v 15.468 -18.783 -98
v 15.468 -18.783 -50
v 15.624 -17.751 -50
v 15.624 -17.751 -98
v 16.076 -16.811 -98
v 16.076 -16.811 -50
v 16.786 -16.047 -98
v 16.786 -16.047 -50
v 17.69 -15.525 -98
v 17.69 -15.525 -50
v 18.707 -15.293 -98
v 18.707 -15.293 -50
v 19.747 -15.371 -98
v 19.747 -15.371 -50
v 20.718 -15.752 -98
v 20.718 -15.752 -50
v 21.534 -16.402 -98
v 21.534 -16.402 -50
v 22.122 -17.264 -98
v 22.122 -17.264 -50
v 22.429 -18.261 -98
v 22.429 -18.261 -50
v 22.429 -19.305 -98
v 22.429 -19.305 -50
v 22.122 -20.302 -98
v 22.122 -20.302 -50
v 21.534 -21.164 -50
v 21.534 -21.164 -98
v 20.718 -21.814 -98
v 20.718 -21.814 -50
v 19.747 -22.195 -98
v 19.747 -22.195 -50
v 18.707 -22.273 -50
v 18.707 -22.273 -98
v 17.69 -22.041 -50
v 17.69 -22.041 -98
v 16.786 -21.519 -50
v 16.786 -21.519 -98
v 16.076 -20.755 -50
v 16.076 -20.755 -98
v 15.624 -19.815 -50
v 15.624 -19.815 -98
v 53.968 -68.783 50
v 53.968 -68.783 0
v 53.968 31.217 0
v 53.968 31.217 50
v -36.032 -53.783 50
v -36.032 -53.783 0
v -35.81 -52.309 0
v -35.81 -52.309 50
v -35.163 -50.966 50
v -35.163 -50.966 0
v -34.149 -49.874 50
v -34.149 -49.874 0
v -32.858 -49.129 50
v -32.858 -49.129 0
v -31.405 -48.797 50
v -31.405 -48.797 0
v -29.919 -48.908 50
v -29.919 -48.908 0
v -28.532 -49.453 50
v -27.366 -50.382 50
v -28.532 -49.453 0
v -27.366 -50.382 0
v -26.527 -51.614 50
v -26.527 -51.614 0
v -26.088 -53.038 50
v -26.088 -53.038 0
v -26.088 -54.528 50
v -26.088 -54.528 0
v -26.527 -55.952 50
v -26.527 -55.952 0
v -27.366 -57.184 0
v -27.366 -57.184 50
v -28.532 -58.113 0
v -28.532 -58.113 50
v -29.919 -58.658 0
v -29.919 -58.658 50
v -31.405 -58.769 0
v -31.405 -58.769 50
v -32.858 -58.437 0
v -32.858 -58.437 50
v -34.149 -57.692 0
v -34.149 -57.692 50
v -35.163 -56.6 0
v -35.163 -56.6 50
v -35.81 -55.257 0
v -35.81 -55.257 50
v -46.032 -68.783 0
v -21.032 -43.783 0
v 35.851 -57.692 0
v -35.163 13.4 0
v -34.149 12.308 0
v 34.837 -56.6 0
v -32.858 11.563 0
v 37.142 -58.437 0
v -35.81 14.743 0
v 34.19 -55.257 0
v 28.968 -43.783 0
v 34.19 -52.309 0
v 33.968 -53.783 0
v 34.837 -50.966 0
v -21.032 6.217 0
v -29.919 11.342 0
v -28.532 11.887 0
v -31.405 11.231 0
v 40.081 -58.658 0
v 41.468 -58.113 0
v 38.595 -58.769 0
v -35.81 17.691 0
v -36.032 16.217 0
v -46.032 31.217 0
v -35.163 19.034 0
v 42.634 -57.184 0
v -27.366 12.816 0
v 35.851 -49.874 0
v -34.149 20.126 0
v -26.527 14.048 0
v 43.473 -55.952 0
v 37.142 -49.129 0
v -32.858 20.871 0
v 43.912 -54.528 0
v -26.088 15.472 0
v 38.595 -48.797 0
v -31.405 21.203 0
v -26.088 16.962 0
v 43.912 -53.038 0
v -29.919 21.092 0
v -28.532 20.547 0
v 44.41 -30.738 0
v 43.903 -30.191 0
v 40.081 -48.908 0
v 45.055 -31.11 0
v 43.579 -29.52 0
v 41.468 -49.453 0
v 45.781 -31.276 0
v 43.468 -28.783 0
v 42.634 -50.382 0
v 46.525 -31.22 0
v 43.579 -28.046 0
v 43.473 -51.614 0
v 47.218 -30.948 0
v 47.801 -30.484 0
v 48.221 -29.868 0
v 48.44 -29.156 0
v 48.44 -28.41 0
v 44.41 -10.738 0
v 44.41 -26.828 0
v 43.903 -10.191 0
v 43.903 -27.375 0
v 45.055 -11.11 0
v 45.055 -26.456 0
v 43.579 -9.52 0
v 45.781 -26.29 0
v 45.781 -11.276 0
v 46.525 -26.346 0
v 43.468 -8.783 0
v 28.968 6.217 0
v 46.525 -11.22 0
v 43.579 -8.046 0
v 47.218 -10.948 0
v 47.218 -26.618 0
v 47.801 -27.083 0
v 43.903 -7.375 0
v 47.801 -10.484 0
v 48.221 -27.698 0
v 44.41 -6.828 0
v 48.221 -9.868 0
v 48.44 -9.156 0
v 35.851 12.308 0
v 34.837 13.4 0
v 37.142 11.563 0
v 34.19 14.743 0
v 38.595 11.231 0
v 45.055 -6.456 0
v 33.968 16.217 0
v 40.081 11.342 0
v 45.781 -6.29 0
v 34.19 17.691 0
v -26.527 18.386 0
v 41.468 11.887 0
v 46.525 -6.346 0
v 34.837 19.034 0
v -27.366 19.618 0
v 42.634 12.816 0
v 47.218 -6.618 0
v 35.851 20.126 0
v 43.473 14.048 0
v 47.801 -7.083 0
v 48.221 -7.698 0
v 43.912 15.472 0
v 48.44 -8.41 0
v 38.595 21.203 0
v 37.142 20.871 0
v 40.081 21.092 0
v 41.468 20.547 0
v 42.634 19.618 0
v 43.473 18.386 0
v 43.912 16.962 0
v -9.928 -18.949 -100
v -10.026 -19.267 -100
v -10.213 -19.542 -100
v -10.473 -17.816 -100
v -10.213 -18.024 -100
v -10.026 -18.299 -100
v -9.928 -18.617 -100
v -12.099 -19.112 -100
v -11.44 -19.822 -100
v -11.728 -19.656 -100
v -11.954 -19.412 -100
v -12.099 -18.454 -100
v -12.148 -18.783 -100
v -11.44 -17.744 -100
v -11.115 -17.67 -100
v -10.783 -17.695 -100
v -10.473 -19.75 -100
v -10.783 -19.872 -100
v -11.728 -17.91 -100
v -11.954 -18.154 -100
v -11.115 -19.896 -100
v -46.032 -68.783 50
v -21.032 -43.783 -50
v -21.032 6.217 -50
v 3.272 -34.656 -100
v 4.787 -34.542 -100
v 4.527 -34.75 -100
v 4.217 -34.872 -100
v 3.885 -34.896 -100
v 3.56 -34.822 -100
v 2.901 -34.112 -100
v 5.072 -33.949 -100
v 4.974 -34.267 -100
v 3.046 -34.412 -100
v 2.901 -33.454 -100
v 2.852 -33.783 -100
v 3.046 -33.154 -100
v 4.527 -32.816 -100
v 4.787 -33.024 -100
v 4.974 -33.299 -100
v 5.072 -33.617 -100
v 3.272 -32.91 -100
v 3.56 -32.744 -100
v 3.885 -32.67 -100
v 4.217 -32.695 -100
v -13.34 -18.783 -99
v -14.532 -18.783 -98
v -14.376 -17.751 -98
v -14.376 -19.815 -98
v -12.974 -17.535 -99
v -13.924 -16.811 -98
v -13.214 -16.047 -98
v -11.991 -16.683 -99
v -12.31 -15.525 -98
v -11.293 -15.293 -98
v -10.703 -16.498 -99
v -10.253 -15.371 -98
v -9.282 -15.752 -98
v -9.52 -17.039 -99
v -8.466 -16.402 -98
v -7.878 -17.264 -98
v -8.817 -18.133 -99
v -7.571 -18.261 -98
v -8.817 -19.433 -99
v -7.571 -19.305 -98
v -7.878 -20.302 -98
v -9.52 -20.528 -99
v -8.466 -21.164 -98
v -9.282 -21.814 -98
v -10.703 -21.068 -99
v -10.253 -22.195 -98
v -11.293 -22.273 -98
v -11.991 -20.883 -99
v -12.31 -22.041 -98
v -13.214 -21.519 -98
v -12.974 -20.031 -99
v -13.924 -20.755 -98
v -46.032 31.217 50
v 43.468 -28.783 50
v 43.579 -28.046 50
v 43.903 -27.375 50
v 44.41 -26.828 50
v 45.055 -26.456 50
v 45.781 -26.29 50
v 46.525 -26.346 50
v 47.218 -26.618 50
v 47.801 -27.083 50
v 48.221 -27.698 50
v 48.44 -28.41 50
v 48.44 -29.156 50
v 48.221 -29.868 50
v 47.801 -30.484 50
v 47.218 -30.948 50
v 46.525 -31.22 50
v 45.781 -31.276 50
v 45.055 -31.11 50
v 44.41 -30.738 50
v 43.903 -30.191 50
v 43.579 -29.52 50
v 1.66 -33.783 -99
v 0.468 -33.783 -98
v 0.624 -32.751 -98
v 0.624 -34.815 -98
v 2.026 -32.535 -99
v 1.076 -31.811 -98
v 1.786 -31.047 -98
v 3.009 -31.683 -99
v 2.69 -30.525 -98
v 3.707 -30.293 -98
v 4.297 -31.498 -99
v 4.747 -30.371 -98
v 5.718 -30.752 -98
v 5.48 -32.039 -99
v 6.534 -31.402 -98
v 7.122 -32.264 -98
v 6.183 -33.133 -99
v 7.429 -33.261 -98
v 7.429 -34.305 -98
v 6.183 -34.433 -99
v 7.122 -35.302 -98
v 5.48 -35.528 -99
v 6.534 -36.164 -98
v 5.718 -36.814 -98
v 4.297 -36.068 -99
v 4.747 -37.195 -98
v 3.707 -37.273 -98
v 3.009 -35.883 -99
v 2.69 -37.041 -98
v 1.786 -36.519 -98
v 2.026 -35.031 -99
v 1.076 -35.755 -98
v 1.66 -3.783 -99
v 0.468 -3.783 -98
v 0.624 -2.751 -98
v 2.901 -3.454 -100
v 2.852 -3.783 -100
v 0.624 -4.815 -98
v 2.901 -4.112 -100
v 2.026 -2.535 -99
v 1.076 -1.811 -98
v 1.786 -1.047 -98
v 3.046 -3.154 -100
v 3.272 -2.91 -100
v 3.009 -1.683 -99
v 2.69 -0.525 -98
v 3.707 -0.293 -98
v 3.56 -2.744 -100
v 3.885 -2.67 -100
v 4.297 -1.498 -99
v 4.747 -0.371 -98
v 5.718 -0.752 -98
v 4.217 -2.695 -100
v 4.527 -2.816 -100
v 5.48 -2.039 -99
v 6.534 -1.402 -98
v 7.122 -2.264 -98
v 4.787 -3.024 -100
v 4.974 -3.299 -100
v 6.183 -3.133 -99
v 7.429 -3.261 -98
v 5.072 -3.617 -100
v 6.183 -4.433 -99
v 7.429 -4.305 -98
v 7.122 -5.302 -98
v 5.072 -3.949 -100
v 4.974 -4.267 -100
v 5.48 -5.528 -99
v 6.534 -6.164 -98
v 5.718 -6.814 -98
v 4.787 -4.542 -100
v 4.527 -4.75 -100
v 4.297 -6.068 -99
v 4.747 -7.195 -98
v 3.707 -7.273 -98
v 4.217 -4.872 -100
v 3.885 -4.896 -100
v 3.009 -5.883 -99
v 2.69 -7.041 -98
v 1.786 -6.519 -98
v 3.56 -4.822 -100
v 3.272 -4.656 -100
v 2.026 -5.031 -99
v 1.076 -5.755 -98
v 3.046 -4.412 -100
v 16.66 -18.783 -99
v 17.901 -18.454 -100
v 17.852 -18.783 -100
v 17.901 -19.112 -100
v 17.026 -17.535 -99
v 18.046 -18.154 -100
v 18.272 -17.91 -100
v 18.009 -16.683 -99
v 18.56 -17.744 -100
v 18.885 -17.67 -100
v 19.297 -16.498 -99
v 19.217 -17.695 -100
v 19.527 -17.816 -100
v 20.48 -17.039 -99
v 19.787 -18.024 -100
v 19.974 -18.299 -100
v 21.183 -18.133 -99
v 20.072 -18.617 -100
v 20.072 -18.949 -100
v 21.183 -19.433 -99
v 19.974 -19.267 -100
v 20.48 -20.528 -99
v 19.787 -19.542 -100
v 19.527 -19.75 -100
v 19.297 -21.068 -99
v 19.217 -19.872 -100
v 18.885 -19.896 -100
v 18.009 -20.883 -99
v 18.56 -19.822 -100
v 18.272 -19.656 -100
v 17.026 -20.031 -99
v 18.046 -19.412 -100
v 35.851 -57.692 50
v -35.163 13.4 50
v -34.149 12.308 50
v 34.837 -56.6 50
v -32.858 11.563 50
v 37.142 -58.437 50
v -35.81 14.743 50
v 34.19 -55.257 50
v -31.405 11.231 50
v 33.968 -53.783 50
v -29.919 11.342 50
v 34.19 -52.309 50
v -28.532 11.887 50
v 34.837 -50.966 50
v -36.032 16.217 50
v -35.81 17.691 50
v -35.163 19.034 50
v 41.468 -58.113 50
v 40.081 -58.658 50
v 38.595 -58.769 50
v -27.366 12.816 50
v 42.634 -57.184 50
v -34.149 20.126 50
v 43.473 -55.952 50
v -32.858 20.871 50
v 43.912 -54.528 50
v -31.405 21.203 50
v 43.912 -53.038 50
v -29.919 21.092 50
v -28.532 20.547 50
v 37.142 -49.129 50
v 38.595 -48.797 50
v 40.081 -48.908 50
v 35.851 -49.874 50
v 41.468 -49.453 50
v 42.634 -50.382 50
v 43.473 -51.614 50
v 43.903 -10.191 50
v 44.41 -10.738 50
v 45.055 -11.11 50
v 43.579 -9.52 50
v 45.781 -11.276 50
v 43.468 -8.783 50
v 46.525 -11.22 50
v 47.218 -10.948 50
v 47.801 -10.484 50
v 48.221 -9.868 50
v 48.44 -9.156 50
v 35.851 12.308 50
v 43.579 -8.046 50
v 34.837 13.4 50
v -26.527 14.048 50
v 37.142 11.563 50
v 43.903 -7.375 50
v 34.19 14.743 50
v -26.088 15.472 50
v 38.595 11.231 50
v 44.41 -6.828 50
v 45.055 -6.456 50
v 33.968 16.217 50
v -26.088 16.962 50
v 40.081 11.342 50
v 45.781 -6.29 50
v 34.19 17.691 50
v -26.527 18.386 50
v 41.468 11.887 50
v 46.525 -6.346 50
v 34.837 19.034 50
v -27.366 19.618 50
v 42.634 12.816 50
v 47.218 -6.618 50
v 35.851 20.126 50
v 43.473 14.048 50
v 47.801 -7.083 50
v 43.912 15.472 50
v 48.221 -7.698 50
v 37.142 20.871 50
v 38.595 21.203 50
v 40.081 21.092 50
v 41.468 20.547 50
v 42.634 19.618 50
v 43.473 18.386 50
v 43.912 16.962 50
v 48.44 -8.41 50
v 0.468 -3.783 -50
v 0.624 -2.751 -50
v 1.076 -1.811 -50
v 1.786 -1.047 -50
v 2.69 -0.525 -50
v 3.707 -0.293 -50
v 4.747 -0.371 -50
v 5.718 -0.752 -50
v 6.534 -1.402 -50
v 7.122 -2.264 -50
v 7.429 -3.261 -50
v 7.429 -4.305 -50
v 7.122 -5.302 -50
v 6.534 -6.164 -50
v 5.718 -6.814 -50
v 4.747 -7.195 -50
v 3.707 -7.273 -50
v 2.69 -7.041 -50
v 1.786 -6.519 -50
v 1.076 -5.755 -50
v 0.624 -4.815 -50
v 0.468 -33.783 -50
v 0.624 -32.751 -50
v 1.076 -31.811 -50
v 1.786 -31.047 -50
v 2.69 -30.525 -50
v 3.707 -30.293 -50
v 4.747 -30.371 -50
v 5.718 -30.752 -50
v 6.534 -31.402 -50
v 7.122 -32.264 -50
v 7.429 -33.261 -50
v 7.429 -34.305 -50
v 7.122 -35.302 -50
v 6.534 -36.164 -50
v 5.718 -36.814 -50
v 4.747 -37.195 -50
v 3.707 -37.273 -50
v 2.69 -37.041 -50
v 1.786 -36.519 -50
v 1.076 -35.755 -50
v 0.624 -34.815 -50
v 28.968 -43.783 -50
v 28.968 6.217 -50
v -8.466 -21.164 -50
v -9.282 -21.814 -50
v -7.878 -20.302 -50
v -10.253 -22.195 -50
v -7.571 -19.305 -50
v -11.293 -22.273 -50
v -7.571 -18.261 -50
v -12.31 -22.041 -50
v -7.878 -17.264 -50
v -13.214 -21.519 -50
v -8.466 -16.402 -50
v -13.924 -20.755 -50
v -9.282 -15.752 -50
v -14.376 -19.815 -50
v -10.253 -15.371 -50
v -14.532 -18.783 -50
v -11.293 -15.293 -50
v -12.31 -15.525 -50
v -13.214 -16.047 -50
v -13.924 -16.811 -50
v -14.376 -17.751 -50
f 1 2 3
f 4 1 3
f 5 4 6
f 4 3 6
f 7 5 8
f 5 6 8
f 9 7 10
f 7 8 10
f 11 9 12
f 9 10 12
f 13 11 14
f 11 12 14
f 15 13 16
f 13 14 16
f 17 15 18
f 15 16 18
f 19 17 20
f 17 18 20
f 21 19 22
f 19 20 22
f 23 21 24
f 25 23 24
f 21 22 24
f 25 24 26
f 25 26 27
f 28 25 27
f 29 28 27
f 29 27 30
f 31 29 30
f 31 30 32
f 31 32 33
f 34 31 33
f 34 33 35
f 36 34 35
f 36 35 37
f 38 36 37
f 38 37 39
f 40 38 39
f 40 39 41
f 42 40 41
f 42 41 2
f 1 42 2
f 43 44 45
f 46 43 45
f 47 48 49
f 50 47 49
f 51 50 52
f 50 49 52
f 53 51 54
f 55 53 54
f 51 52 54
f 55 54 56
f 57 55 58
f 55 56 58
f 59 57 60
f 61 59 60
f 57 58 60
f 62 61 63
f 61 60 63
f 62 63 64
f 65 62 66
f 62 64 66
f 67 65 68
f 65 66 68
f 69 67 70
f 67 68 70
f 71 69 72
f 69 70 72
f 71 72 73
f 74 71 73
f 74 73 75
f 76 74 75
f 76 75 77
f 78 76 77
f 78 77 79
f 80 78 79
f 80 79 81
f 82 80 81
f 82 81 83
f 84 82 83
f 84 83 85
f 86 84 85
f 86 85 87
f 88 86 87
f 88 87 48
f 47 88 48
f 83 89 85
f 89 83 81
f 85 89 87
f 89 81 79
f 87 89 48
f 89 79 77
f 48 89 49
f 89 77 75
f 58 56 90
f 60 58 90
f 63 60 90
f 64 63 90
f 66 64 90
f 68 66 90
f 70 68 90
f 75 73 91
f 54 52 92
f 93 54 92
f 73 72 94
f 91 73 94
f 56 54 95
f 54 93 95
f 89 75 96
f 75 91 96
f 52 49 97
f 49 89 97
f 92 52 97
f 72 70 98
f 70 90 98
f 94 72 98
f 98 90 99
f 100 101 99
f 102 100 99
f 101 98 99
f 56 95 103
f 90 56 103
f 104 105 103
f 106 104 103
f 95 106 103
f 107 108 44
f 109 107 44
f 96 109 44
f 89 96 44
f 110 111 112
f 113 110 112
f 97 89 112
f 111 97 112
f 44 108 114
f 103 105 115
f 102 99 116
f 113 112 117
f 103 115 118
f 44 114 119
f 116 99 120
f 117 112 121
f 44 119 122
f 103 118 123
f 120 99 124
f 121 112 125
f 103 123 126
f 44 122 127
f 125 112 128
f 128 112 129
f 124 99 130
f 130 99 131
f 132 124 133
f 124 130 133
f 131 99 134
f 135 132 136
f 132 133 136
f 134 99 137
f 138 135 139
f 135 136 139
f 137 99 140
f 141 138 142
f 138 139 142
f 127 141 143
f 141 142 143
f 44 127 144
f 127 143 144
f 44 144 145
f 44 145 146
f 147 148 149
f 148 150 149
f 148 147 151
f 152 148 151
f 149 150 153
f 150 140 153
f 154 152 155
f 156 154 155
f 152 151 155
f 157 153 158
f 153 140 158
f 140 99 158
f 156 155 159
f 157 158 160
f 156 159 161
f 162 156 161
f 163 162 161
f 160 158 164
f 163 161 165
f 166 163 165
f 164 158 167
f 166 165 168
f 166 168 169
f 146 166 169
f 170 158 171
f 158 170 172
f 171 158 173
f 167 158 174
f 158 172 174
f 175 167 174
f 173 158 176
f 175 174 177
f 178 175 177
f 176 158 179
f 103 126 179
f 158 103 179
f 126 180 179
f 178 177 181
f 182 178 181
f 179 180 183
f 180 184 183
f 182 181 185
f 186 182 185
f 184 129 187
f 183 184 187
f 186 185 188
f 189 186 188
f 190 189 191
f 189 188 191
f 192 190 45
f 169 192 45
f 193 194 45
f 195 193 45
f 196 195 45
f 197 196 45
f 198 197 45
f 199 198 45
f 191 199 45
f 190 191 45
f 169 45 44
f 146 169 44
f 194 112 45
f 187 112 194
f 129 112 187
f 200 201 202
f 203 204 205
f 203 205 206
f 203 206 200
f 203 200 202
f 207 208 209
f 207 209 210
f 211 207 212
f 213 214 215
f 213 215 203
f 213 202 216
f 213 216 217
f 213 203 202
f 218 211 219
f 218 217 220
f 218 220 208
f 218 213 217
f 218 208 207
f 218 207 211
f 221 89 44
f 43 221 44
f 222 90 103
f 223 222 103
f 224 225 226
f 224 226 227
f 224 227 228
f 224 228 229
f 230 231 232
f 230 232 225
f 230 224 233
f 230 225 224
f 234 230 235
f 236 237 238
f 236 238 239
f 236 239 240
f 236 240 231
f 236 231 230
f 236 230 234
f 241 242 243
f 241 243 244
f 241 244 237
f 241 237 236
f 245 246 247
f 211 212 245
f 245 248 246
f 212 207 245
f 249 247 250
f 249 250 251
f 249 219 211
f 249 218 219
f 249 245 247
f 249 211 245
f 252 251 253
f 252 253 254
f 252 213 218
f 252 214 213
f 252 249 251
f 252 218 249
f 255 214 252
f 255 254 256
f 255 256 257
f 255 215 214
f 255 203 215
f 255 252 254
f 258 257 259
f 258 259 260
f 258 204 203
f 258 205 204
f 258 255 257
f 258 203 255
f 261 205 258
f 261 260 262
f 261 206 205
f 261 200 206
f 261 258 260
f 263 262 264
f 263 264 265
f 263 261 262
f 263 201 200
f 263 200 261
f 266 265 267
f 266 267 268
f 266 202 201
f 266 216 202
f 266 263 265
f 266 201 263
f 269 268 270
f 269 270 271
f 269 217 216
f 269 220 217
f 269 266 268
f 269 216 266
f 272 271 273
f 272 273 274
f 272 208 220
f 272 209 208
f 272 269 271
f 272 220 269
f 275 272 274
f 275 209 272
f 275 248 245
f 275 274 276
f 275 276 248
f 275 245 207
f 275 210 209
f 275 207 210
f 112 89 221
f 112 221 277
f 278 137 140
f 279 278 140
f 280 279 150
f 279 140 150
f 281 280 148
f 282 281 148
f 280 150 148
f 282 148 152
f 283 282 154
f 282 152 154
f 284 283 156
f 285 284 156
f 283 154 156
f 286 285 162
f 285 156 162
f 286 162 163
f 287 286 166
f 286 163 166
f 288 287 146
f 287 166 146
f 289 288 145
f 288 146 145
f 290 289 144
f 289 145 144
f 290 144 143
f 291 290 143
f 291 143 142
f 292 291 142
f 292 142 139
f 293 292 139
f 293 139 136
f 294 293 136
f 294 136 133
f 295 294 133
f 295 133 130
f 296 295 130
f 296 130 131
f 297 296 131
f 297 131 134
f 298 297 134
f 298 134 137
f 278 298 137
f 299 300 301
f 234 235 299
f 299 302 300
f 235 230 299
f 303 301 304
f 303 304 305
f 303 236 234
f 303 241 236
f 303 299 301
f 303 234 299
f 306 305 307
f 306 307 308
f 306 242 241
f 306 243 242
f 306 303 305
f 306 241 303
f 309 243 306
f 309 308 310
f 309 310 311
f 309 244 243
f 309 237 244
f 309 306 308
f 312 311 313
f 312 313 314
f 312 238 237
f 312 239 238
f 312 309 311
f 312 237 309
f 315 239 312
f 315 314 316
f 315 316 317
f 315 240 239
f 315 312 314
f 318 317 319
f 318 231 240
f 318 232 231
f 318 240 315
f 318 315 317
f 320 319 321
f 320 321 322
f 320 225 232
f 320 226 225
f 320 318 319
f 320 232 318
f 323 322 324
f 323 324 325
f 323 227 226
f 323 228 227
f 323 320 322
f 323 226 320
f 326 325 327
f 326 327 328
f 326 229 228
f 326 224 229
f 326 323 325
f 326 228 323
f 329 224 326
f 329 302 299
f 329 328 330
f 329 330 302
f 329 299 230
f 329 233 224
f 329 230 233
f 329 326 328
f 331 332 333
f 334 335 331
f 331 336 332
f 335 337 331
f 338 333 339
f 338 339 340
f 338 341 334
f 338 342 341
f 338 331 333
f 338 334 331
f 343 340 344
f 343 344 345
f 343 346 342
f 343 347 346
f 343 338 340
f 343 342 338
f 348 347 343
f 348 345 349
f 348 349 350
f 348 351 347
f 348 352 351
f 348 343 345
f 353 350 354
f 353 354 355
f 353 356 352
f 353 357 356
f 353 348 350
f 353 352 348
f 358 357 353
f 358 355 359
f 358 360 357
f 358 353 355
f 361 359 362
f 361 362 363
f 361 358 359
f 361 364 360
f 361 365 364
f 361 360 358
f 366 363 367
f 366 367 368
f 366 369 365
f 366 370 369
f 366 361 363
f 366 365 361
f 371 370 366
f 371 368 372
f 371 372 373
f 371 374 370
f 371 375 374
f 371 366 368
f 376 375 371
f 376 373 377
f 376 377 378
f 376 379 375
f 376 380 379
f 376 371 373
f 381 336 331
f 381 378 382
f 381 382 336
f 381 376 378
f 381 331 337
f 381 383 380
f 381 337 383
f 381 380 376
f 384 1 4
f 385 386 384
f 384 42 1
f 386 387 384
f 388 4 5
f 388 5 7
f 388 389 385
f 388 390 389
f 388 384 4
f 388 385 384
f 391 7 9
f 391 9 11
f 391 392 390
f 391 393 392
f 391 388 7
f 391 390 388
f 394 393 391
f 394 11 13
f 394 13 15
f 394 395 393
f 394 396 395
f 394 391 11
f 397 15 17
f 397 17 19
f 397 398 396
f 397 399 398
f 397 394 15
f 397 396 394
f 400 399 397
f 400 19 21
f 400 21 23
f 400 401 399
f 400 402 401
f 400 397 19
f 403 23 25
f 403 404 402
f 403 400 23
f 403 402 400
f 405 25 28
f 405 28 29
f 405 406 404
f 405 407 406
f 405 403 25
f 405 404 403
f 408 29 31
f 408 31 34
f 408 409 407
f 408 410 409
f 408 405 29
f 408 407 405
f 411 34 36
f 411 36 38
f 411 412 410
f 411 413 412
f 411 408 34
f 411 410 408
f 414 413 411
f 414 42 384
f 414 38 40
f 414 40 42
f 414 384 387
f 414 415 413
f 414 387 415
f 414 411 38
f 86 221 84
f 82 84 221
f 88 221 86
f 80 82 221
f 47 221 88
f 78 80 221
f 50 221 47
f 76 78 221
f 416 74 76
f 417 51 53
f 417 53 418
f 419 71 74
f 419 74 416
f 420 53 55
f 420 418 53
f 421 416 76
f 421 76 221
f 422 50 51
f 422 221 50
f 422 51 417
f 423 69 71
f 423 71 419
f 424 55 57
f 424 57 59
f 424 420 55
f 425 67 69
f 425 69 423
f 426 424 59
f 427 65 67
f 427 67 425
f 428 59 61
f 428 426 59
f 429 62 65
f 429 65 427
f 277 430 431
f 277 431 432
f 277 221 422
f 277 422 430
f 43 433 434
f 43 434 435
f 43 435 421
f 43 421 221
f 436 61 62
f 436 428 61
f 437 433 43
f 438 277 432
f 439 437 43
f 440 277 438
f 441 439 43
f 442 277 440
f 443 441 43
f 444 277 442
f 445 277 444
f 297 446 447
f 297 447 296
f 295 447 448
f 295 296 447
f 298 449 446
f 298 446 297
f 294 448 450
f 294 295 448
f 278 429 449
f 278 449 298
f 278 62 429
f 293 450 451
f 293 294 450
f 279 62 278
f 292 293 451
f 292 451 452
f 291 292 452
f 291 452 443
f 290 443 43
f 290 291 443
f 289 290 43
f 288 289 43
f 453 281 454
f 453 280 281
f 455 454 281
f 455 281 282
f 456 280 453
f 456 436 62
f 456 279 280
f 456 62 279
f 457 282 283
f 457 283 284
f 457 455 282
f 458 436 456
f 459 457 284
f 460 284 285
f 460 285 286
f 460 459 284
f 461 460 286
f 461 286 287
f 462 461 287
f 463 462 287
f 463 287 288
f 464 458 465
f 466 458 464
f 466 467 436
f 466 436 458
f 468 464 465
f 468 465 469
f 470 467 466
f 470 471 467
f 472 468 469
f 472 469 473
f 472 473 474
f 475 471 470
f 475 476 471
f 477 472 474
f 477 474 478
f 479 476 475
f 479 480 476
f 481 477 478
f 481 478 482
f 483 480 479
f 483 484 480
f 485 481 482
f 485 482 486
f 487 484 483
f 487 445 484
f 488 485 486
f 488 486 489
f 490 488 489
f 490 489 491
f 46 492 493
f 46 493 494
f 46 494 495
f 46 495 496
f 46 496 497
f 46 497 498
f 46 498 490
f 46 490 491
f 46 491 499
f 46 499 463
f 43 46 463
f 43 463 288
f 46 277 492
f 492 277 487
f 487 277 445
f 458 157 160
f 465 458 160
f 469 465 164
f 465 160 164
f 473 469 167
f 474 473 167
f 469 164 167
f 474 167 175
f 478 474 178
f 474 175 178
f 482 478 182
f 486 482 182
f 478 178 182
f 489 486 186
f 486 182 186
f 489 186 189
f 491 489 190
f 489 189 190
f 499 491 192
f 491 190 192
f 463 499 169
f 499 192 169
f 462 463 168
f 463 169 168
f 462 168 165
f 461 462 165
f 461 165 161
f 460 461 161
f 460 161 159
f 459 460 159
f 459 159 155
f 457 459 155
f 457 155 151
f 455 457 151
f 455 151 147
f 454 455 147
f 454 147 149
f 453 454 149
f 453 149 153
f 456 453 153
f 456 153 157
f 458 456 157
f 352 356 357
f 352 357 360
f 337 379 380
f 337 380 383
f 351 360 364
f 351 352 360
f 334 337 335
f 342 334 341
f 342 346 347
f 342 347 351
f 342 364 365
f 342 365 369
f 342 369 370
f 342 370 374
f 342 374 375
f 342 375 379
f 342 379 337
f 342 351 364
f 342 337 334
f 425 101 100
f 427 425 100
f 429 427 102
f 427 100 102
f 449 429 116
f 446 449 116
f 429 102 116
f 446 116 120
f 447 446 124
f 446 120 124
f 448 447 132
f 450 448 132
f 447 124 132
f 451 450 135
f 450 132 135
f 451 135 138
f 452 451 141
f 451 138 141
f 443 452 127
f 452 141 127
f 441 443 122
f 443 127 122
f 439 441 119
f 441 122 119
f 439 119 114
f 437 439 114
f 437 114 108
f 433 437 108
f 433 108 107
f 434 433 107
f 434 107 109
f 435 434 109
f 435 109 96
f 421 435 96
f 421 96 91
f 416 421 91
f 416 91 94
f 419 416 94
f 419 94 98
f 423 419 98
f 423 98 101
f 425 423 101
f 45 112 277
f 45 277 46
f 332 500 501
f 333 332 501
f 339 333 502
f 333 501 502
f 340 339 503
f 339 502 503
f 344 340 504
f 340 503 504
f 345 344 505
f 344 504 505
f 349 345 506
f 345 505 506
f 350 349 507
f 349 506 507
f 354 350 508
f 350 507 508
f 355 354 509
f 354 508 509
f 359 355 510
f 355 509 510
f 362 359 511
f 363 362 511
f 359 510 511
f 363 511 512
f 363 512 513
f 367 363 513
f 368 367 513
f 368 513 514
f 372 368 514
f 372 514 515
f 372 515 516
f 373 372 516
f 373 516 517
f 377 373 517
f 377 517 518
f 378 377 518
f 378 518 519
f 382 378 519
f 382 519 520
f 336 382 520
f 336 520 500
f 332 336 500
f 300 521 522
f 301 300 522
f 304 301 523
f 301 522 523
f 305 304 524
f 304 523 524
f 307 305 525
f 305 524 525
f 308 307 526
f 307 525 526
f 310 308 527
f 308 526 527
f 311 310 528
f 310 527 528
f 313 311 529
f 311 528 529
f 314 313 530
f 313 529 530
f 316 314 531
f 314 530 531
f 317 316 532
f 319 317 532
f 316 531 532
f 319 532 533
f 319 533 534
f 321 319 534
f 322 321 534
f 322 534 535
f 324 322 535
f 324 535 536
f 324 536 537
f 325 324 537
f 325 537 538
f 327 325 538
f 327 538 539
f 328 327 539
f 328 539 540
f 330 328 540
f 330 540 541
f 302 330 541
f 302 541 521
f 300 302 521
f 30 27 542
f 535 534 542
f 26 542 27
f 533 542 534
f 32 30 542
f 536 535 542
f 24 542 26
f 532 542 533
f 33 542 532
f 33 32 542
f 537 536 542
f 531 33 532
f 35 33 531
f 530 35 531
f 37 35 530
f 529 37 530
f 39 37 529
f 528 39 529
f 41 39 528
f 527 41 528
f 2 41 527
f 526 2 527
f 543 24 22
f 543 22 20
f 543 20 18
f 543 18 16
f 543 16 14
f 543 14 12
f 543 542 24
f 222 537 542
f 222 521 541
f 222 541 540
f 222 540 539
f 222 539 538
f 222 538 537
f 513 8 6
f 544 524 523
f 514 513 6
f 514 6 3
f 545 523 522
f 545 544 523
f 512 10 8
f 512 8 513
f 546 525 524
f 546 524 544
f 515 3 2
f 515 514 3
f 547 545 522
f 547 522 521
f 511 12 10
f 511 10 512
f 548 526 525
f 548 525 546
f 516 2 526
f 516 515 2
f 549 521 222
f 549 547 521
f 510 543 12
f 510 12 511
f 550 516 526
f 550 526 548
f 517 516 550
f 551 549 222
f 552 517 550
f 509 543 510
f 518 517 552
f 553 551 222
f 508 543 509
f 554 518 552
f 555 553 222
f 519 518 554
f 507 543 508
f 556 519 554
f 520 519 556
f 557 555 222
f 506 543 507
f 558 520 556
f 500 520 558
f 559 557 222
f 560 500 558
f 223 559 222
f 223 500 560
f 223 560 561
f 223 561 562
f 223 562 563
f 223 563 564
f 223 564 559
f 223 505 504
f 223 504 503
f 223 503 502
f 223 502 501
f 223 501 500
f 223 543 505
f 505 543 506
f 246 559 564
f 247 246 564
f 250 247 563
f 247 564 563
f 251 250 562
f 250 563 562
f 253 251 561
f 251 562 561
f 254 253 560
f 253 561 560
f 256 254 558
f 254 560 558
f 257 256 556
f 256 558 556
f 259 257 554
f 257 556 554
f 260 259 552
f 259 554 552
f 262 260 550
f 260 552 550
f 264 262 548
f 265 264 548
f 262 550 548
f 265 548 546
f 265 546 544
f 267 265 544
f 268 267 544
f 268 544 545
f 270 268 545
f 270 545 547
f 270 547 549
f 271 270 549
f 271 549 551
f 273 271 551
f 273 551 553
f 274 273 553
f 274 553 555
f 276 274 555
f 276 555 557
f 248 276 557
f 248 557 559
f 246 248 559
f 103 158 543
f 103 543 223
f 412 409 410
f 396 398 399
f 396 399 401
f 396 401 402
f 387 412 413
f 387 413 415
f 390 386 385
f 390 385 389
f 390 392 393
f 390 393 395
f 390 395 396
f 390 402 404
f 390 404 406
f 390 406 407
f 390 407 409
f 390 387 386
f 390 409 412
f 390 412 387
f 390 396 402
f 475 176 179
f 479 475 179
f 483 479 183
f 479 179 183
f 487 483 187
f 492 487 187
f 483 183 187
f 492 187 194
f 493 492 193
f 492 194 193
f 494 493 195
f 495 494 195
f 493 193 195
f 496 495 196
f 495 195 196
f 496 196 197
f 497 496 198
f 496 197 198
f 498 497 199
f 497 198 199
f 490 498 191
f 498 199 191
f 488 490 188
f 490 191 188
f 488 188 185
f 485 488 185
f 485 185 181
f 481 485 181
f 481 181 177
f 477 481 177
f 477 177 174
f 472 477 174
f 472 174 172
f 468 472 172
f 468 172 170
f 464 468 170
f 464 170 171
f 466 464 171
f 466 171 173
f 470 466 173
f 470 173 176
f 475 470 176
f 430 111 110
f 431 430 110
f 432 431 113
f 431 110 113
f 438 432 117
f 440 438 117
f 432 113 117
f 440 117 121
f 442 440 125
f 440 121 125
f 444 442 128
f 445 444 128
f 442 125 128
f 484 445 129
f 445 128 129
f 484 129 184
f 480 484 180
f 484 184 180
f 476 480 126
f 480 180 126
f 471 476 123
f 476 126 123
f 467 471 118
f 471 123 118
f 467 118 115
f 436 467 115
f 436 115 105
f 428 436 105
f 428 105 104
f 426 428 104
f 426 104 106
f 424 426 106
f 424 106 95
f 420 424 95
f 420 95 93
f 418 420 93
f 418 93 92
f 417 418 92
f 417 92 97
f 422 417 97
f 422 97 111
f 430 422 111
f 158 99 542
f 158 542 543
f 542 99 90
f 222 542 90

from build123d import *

# Parameters (mm, degrees)
SKETCH_1_W             = 100
SKETCH_1_H             = 100
EXTRUDE_1_DEPTH        = 50
SKETCH_2_R             = 5
CUT_EXTRUDE_1_DEPTH    = 51
SKETCH_4_R             = 2.5
CUT_EXTRUDE_2_DEPTH    = 51
SKETCH_5_W             = 50
SKETCH_5_H             = 50
EXTRUDE_3_DEPTH        = 50
SKETCH_3_R             = 3.5
EXTRUDE_4_DEPTH        = 100
CHAMFER_4_SIZE         = 2
CHAMFER_4_SIZE2        = 2.383507185
CHAMFER_4_PART_2_SIZE  = 2
CHAMFER_4_PART_2_SIZE2 = 2.383507185
CHAMFER_4_PART_3_SIZE  = 2
CHAMFER_4_PART_3_SIZE2 = 2.383507185
CHAMFER_4_PART_4_SIZE  = 2
CHAMFER_4_PART_4_SIZE2 = 2.383507185


with BuildPart() as part:
    # 草图1 → 凸台-拉伸1 (new body)
    with BuildSketch(Plane.XY):
        with Locations((3.968253968, -18.783068783)):
            Rectangle(SKETCH_1_W, SKETCH_1_H)
    extrude(amount=EXTRUDE_1_DEPTH)

    # 草图2 → 切除-拉伸1 (cut, through all)
    with BuildSketch(Plane(origin=(0, 0, 0), x_dir=(-1, 0, 0), z_dir=(0, 0, -1))):
        with Locations((-38.968253968, 16.216931217)):
            Circle(SKETCH_2_R)
        with Locations((31.031746032, 16.216931217)):
            Circle(SKETCH_2_R)
        with Locations((-38.968253968, -53.783068783)):
            Circle(SKETCH_2_R)
        with Locations((31.031746032, -53.783068783)):
            Circle(SKETCH_2_R)
    extrude(amount=-CUT_EXTRUDE_1_DEPTH, mode=Mode.SUBTRACT)

    # 草图4 → 切除-拉伸2 (cut, through all)
    with BuildSketch(Plane(origin=(0, 0, 0), x_dir=(-1, 0, 0), z_dir=(0, 0, -1))):
        with Locations((-45.968253968, -8.783068783)):
            Circle(SKETCH_4_R)
        with Locations((-45.968253968, -28.783068783)):
            Circle(SKETCH_4_R)
    extrude(amount=-CUT_EXTRUDE_2_DEPTH, mode=Mode.SUBTRACT)

    # 草图5 → 凸台-拉伸3 (add)
    with BuildSketch(Plane(origin=(0, 0, 0), x_dir=(-1, 0, 0), z_dir=(0, 0, -1))):
        with Locations((-3.968253968, -18.783068783)):
            Rectangle(SKETCH_5_W, SKETCH_5_H)
    extrude(amount=EXTRUDE_3_DEPTH)

    # 草图3 → 凸台-拉伸4 (add)
    with BuildSketch(Plane(origin=(0, 0, 0), x_dir=(-1, 0, 0), z_dir=(0, 0, -1))):
        with Locations((-3.968253968, -3.783068783)):
            Circle(SKETCH_3_R)
        with Locations((-18.968253968, -18.783068783)):
            Circle(SKETCH_3_R)
        with Locations((-3.968253968, -33.783068783)):
            Circle(SKETCH_3_R)
        with Locations((11.031746032, -18.783068783)):
            Circle(SKETCH_3_R)
    extrude(amount=EXTRUDE_4_DEPTH)

    # 倒角4
    chamfer_4_edges = [part.edges().sort_by_distance(p)[0] for p in [
        (7.468253968, -3.783068783, -100),
    ]]
    chamfer_4_side = [part.faces().sort_by_distance(p)[0] for p in [
        (7.468253968, -3.783068783, -75),
    ]]
    chamfer(chamfer_4_edges, length=CHAMFER_4_SIZE, length2=CHAMFER_4_SIZE2, reference=chamfer_4_side[0])

    # 倒角4 part 2
    chamfer_4_part_2_edges = [part.edges().sort_by_distance(p)[0] for p in [
        (22.468253968, -18.783068783, -100),
    ]]
    chamfer_4_part_2_side = [part.faces().sort_by_distance(p)[0] for p in [
        (22.468253968, -18.783068783, -75),
    ]]
    chamfer(chamfer_4_part_2_edges, length=CHAMFER_4_PART_2_SIZE, length2=CHAMFER_4_PART_2_SIZE2, reference=chamfer_4_part_2_side[0])

    # 倒角4 part 3
    chamfer_4_part_3_edges = [part.edges().sort_by_distance(p)[0] for p in [
        (7.468253968, -33.783068783, -100),
    ]]
    chamfer_4_part_3_side = [part.faces().sort_by_distance(p)[0] for p in [
        (7.468253968, -33.783068783, -75),
    ]]
    chamfer(chamfer_4_part_3_edges, length=CHAMFER_4_PART_3_SIZE, length2=CHAMFER_4_PART_3_SIZE2, reference=chamfer_4_part_3_side[0])

    # 倒角4 part 4
    chamfer_4_part_4_edges = [part.edges().sort_by_distance(p)[0] for p in [
        (-7.531746032, -18.783068783, -100),
    ]]
    chamfer_4_part_4_side = [part.faces().sort_by_distance(p)[0] for p in [
        (-7.531746032, -18.783068783, -75),
    ]]
    chamfer(chamfer_4_part_4_edges, length=CHAMFER_4_PART_4_SIZE, length2=CHAMFER_4_PART_4_SIZE2, reference=chamfer_4_part_4_side[0])


solid = part.part
